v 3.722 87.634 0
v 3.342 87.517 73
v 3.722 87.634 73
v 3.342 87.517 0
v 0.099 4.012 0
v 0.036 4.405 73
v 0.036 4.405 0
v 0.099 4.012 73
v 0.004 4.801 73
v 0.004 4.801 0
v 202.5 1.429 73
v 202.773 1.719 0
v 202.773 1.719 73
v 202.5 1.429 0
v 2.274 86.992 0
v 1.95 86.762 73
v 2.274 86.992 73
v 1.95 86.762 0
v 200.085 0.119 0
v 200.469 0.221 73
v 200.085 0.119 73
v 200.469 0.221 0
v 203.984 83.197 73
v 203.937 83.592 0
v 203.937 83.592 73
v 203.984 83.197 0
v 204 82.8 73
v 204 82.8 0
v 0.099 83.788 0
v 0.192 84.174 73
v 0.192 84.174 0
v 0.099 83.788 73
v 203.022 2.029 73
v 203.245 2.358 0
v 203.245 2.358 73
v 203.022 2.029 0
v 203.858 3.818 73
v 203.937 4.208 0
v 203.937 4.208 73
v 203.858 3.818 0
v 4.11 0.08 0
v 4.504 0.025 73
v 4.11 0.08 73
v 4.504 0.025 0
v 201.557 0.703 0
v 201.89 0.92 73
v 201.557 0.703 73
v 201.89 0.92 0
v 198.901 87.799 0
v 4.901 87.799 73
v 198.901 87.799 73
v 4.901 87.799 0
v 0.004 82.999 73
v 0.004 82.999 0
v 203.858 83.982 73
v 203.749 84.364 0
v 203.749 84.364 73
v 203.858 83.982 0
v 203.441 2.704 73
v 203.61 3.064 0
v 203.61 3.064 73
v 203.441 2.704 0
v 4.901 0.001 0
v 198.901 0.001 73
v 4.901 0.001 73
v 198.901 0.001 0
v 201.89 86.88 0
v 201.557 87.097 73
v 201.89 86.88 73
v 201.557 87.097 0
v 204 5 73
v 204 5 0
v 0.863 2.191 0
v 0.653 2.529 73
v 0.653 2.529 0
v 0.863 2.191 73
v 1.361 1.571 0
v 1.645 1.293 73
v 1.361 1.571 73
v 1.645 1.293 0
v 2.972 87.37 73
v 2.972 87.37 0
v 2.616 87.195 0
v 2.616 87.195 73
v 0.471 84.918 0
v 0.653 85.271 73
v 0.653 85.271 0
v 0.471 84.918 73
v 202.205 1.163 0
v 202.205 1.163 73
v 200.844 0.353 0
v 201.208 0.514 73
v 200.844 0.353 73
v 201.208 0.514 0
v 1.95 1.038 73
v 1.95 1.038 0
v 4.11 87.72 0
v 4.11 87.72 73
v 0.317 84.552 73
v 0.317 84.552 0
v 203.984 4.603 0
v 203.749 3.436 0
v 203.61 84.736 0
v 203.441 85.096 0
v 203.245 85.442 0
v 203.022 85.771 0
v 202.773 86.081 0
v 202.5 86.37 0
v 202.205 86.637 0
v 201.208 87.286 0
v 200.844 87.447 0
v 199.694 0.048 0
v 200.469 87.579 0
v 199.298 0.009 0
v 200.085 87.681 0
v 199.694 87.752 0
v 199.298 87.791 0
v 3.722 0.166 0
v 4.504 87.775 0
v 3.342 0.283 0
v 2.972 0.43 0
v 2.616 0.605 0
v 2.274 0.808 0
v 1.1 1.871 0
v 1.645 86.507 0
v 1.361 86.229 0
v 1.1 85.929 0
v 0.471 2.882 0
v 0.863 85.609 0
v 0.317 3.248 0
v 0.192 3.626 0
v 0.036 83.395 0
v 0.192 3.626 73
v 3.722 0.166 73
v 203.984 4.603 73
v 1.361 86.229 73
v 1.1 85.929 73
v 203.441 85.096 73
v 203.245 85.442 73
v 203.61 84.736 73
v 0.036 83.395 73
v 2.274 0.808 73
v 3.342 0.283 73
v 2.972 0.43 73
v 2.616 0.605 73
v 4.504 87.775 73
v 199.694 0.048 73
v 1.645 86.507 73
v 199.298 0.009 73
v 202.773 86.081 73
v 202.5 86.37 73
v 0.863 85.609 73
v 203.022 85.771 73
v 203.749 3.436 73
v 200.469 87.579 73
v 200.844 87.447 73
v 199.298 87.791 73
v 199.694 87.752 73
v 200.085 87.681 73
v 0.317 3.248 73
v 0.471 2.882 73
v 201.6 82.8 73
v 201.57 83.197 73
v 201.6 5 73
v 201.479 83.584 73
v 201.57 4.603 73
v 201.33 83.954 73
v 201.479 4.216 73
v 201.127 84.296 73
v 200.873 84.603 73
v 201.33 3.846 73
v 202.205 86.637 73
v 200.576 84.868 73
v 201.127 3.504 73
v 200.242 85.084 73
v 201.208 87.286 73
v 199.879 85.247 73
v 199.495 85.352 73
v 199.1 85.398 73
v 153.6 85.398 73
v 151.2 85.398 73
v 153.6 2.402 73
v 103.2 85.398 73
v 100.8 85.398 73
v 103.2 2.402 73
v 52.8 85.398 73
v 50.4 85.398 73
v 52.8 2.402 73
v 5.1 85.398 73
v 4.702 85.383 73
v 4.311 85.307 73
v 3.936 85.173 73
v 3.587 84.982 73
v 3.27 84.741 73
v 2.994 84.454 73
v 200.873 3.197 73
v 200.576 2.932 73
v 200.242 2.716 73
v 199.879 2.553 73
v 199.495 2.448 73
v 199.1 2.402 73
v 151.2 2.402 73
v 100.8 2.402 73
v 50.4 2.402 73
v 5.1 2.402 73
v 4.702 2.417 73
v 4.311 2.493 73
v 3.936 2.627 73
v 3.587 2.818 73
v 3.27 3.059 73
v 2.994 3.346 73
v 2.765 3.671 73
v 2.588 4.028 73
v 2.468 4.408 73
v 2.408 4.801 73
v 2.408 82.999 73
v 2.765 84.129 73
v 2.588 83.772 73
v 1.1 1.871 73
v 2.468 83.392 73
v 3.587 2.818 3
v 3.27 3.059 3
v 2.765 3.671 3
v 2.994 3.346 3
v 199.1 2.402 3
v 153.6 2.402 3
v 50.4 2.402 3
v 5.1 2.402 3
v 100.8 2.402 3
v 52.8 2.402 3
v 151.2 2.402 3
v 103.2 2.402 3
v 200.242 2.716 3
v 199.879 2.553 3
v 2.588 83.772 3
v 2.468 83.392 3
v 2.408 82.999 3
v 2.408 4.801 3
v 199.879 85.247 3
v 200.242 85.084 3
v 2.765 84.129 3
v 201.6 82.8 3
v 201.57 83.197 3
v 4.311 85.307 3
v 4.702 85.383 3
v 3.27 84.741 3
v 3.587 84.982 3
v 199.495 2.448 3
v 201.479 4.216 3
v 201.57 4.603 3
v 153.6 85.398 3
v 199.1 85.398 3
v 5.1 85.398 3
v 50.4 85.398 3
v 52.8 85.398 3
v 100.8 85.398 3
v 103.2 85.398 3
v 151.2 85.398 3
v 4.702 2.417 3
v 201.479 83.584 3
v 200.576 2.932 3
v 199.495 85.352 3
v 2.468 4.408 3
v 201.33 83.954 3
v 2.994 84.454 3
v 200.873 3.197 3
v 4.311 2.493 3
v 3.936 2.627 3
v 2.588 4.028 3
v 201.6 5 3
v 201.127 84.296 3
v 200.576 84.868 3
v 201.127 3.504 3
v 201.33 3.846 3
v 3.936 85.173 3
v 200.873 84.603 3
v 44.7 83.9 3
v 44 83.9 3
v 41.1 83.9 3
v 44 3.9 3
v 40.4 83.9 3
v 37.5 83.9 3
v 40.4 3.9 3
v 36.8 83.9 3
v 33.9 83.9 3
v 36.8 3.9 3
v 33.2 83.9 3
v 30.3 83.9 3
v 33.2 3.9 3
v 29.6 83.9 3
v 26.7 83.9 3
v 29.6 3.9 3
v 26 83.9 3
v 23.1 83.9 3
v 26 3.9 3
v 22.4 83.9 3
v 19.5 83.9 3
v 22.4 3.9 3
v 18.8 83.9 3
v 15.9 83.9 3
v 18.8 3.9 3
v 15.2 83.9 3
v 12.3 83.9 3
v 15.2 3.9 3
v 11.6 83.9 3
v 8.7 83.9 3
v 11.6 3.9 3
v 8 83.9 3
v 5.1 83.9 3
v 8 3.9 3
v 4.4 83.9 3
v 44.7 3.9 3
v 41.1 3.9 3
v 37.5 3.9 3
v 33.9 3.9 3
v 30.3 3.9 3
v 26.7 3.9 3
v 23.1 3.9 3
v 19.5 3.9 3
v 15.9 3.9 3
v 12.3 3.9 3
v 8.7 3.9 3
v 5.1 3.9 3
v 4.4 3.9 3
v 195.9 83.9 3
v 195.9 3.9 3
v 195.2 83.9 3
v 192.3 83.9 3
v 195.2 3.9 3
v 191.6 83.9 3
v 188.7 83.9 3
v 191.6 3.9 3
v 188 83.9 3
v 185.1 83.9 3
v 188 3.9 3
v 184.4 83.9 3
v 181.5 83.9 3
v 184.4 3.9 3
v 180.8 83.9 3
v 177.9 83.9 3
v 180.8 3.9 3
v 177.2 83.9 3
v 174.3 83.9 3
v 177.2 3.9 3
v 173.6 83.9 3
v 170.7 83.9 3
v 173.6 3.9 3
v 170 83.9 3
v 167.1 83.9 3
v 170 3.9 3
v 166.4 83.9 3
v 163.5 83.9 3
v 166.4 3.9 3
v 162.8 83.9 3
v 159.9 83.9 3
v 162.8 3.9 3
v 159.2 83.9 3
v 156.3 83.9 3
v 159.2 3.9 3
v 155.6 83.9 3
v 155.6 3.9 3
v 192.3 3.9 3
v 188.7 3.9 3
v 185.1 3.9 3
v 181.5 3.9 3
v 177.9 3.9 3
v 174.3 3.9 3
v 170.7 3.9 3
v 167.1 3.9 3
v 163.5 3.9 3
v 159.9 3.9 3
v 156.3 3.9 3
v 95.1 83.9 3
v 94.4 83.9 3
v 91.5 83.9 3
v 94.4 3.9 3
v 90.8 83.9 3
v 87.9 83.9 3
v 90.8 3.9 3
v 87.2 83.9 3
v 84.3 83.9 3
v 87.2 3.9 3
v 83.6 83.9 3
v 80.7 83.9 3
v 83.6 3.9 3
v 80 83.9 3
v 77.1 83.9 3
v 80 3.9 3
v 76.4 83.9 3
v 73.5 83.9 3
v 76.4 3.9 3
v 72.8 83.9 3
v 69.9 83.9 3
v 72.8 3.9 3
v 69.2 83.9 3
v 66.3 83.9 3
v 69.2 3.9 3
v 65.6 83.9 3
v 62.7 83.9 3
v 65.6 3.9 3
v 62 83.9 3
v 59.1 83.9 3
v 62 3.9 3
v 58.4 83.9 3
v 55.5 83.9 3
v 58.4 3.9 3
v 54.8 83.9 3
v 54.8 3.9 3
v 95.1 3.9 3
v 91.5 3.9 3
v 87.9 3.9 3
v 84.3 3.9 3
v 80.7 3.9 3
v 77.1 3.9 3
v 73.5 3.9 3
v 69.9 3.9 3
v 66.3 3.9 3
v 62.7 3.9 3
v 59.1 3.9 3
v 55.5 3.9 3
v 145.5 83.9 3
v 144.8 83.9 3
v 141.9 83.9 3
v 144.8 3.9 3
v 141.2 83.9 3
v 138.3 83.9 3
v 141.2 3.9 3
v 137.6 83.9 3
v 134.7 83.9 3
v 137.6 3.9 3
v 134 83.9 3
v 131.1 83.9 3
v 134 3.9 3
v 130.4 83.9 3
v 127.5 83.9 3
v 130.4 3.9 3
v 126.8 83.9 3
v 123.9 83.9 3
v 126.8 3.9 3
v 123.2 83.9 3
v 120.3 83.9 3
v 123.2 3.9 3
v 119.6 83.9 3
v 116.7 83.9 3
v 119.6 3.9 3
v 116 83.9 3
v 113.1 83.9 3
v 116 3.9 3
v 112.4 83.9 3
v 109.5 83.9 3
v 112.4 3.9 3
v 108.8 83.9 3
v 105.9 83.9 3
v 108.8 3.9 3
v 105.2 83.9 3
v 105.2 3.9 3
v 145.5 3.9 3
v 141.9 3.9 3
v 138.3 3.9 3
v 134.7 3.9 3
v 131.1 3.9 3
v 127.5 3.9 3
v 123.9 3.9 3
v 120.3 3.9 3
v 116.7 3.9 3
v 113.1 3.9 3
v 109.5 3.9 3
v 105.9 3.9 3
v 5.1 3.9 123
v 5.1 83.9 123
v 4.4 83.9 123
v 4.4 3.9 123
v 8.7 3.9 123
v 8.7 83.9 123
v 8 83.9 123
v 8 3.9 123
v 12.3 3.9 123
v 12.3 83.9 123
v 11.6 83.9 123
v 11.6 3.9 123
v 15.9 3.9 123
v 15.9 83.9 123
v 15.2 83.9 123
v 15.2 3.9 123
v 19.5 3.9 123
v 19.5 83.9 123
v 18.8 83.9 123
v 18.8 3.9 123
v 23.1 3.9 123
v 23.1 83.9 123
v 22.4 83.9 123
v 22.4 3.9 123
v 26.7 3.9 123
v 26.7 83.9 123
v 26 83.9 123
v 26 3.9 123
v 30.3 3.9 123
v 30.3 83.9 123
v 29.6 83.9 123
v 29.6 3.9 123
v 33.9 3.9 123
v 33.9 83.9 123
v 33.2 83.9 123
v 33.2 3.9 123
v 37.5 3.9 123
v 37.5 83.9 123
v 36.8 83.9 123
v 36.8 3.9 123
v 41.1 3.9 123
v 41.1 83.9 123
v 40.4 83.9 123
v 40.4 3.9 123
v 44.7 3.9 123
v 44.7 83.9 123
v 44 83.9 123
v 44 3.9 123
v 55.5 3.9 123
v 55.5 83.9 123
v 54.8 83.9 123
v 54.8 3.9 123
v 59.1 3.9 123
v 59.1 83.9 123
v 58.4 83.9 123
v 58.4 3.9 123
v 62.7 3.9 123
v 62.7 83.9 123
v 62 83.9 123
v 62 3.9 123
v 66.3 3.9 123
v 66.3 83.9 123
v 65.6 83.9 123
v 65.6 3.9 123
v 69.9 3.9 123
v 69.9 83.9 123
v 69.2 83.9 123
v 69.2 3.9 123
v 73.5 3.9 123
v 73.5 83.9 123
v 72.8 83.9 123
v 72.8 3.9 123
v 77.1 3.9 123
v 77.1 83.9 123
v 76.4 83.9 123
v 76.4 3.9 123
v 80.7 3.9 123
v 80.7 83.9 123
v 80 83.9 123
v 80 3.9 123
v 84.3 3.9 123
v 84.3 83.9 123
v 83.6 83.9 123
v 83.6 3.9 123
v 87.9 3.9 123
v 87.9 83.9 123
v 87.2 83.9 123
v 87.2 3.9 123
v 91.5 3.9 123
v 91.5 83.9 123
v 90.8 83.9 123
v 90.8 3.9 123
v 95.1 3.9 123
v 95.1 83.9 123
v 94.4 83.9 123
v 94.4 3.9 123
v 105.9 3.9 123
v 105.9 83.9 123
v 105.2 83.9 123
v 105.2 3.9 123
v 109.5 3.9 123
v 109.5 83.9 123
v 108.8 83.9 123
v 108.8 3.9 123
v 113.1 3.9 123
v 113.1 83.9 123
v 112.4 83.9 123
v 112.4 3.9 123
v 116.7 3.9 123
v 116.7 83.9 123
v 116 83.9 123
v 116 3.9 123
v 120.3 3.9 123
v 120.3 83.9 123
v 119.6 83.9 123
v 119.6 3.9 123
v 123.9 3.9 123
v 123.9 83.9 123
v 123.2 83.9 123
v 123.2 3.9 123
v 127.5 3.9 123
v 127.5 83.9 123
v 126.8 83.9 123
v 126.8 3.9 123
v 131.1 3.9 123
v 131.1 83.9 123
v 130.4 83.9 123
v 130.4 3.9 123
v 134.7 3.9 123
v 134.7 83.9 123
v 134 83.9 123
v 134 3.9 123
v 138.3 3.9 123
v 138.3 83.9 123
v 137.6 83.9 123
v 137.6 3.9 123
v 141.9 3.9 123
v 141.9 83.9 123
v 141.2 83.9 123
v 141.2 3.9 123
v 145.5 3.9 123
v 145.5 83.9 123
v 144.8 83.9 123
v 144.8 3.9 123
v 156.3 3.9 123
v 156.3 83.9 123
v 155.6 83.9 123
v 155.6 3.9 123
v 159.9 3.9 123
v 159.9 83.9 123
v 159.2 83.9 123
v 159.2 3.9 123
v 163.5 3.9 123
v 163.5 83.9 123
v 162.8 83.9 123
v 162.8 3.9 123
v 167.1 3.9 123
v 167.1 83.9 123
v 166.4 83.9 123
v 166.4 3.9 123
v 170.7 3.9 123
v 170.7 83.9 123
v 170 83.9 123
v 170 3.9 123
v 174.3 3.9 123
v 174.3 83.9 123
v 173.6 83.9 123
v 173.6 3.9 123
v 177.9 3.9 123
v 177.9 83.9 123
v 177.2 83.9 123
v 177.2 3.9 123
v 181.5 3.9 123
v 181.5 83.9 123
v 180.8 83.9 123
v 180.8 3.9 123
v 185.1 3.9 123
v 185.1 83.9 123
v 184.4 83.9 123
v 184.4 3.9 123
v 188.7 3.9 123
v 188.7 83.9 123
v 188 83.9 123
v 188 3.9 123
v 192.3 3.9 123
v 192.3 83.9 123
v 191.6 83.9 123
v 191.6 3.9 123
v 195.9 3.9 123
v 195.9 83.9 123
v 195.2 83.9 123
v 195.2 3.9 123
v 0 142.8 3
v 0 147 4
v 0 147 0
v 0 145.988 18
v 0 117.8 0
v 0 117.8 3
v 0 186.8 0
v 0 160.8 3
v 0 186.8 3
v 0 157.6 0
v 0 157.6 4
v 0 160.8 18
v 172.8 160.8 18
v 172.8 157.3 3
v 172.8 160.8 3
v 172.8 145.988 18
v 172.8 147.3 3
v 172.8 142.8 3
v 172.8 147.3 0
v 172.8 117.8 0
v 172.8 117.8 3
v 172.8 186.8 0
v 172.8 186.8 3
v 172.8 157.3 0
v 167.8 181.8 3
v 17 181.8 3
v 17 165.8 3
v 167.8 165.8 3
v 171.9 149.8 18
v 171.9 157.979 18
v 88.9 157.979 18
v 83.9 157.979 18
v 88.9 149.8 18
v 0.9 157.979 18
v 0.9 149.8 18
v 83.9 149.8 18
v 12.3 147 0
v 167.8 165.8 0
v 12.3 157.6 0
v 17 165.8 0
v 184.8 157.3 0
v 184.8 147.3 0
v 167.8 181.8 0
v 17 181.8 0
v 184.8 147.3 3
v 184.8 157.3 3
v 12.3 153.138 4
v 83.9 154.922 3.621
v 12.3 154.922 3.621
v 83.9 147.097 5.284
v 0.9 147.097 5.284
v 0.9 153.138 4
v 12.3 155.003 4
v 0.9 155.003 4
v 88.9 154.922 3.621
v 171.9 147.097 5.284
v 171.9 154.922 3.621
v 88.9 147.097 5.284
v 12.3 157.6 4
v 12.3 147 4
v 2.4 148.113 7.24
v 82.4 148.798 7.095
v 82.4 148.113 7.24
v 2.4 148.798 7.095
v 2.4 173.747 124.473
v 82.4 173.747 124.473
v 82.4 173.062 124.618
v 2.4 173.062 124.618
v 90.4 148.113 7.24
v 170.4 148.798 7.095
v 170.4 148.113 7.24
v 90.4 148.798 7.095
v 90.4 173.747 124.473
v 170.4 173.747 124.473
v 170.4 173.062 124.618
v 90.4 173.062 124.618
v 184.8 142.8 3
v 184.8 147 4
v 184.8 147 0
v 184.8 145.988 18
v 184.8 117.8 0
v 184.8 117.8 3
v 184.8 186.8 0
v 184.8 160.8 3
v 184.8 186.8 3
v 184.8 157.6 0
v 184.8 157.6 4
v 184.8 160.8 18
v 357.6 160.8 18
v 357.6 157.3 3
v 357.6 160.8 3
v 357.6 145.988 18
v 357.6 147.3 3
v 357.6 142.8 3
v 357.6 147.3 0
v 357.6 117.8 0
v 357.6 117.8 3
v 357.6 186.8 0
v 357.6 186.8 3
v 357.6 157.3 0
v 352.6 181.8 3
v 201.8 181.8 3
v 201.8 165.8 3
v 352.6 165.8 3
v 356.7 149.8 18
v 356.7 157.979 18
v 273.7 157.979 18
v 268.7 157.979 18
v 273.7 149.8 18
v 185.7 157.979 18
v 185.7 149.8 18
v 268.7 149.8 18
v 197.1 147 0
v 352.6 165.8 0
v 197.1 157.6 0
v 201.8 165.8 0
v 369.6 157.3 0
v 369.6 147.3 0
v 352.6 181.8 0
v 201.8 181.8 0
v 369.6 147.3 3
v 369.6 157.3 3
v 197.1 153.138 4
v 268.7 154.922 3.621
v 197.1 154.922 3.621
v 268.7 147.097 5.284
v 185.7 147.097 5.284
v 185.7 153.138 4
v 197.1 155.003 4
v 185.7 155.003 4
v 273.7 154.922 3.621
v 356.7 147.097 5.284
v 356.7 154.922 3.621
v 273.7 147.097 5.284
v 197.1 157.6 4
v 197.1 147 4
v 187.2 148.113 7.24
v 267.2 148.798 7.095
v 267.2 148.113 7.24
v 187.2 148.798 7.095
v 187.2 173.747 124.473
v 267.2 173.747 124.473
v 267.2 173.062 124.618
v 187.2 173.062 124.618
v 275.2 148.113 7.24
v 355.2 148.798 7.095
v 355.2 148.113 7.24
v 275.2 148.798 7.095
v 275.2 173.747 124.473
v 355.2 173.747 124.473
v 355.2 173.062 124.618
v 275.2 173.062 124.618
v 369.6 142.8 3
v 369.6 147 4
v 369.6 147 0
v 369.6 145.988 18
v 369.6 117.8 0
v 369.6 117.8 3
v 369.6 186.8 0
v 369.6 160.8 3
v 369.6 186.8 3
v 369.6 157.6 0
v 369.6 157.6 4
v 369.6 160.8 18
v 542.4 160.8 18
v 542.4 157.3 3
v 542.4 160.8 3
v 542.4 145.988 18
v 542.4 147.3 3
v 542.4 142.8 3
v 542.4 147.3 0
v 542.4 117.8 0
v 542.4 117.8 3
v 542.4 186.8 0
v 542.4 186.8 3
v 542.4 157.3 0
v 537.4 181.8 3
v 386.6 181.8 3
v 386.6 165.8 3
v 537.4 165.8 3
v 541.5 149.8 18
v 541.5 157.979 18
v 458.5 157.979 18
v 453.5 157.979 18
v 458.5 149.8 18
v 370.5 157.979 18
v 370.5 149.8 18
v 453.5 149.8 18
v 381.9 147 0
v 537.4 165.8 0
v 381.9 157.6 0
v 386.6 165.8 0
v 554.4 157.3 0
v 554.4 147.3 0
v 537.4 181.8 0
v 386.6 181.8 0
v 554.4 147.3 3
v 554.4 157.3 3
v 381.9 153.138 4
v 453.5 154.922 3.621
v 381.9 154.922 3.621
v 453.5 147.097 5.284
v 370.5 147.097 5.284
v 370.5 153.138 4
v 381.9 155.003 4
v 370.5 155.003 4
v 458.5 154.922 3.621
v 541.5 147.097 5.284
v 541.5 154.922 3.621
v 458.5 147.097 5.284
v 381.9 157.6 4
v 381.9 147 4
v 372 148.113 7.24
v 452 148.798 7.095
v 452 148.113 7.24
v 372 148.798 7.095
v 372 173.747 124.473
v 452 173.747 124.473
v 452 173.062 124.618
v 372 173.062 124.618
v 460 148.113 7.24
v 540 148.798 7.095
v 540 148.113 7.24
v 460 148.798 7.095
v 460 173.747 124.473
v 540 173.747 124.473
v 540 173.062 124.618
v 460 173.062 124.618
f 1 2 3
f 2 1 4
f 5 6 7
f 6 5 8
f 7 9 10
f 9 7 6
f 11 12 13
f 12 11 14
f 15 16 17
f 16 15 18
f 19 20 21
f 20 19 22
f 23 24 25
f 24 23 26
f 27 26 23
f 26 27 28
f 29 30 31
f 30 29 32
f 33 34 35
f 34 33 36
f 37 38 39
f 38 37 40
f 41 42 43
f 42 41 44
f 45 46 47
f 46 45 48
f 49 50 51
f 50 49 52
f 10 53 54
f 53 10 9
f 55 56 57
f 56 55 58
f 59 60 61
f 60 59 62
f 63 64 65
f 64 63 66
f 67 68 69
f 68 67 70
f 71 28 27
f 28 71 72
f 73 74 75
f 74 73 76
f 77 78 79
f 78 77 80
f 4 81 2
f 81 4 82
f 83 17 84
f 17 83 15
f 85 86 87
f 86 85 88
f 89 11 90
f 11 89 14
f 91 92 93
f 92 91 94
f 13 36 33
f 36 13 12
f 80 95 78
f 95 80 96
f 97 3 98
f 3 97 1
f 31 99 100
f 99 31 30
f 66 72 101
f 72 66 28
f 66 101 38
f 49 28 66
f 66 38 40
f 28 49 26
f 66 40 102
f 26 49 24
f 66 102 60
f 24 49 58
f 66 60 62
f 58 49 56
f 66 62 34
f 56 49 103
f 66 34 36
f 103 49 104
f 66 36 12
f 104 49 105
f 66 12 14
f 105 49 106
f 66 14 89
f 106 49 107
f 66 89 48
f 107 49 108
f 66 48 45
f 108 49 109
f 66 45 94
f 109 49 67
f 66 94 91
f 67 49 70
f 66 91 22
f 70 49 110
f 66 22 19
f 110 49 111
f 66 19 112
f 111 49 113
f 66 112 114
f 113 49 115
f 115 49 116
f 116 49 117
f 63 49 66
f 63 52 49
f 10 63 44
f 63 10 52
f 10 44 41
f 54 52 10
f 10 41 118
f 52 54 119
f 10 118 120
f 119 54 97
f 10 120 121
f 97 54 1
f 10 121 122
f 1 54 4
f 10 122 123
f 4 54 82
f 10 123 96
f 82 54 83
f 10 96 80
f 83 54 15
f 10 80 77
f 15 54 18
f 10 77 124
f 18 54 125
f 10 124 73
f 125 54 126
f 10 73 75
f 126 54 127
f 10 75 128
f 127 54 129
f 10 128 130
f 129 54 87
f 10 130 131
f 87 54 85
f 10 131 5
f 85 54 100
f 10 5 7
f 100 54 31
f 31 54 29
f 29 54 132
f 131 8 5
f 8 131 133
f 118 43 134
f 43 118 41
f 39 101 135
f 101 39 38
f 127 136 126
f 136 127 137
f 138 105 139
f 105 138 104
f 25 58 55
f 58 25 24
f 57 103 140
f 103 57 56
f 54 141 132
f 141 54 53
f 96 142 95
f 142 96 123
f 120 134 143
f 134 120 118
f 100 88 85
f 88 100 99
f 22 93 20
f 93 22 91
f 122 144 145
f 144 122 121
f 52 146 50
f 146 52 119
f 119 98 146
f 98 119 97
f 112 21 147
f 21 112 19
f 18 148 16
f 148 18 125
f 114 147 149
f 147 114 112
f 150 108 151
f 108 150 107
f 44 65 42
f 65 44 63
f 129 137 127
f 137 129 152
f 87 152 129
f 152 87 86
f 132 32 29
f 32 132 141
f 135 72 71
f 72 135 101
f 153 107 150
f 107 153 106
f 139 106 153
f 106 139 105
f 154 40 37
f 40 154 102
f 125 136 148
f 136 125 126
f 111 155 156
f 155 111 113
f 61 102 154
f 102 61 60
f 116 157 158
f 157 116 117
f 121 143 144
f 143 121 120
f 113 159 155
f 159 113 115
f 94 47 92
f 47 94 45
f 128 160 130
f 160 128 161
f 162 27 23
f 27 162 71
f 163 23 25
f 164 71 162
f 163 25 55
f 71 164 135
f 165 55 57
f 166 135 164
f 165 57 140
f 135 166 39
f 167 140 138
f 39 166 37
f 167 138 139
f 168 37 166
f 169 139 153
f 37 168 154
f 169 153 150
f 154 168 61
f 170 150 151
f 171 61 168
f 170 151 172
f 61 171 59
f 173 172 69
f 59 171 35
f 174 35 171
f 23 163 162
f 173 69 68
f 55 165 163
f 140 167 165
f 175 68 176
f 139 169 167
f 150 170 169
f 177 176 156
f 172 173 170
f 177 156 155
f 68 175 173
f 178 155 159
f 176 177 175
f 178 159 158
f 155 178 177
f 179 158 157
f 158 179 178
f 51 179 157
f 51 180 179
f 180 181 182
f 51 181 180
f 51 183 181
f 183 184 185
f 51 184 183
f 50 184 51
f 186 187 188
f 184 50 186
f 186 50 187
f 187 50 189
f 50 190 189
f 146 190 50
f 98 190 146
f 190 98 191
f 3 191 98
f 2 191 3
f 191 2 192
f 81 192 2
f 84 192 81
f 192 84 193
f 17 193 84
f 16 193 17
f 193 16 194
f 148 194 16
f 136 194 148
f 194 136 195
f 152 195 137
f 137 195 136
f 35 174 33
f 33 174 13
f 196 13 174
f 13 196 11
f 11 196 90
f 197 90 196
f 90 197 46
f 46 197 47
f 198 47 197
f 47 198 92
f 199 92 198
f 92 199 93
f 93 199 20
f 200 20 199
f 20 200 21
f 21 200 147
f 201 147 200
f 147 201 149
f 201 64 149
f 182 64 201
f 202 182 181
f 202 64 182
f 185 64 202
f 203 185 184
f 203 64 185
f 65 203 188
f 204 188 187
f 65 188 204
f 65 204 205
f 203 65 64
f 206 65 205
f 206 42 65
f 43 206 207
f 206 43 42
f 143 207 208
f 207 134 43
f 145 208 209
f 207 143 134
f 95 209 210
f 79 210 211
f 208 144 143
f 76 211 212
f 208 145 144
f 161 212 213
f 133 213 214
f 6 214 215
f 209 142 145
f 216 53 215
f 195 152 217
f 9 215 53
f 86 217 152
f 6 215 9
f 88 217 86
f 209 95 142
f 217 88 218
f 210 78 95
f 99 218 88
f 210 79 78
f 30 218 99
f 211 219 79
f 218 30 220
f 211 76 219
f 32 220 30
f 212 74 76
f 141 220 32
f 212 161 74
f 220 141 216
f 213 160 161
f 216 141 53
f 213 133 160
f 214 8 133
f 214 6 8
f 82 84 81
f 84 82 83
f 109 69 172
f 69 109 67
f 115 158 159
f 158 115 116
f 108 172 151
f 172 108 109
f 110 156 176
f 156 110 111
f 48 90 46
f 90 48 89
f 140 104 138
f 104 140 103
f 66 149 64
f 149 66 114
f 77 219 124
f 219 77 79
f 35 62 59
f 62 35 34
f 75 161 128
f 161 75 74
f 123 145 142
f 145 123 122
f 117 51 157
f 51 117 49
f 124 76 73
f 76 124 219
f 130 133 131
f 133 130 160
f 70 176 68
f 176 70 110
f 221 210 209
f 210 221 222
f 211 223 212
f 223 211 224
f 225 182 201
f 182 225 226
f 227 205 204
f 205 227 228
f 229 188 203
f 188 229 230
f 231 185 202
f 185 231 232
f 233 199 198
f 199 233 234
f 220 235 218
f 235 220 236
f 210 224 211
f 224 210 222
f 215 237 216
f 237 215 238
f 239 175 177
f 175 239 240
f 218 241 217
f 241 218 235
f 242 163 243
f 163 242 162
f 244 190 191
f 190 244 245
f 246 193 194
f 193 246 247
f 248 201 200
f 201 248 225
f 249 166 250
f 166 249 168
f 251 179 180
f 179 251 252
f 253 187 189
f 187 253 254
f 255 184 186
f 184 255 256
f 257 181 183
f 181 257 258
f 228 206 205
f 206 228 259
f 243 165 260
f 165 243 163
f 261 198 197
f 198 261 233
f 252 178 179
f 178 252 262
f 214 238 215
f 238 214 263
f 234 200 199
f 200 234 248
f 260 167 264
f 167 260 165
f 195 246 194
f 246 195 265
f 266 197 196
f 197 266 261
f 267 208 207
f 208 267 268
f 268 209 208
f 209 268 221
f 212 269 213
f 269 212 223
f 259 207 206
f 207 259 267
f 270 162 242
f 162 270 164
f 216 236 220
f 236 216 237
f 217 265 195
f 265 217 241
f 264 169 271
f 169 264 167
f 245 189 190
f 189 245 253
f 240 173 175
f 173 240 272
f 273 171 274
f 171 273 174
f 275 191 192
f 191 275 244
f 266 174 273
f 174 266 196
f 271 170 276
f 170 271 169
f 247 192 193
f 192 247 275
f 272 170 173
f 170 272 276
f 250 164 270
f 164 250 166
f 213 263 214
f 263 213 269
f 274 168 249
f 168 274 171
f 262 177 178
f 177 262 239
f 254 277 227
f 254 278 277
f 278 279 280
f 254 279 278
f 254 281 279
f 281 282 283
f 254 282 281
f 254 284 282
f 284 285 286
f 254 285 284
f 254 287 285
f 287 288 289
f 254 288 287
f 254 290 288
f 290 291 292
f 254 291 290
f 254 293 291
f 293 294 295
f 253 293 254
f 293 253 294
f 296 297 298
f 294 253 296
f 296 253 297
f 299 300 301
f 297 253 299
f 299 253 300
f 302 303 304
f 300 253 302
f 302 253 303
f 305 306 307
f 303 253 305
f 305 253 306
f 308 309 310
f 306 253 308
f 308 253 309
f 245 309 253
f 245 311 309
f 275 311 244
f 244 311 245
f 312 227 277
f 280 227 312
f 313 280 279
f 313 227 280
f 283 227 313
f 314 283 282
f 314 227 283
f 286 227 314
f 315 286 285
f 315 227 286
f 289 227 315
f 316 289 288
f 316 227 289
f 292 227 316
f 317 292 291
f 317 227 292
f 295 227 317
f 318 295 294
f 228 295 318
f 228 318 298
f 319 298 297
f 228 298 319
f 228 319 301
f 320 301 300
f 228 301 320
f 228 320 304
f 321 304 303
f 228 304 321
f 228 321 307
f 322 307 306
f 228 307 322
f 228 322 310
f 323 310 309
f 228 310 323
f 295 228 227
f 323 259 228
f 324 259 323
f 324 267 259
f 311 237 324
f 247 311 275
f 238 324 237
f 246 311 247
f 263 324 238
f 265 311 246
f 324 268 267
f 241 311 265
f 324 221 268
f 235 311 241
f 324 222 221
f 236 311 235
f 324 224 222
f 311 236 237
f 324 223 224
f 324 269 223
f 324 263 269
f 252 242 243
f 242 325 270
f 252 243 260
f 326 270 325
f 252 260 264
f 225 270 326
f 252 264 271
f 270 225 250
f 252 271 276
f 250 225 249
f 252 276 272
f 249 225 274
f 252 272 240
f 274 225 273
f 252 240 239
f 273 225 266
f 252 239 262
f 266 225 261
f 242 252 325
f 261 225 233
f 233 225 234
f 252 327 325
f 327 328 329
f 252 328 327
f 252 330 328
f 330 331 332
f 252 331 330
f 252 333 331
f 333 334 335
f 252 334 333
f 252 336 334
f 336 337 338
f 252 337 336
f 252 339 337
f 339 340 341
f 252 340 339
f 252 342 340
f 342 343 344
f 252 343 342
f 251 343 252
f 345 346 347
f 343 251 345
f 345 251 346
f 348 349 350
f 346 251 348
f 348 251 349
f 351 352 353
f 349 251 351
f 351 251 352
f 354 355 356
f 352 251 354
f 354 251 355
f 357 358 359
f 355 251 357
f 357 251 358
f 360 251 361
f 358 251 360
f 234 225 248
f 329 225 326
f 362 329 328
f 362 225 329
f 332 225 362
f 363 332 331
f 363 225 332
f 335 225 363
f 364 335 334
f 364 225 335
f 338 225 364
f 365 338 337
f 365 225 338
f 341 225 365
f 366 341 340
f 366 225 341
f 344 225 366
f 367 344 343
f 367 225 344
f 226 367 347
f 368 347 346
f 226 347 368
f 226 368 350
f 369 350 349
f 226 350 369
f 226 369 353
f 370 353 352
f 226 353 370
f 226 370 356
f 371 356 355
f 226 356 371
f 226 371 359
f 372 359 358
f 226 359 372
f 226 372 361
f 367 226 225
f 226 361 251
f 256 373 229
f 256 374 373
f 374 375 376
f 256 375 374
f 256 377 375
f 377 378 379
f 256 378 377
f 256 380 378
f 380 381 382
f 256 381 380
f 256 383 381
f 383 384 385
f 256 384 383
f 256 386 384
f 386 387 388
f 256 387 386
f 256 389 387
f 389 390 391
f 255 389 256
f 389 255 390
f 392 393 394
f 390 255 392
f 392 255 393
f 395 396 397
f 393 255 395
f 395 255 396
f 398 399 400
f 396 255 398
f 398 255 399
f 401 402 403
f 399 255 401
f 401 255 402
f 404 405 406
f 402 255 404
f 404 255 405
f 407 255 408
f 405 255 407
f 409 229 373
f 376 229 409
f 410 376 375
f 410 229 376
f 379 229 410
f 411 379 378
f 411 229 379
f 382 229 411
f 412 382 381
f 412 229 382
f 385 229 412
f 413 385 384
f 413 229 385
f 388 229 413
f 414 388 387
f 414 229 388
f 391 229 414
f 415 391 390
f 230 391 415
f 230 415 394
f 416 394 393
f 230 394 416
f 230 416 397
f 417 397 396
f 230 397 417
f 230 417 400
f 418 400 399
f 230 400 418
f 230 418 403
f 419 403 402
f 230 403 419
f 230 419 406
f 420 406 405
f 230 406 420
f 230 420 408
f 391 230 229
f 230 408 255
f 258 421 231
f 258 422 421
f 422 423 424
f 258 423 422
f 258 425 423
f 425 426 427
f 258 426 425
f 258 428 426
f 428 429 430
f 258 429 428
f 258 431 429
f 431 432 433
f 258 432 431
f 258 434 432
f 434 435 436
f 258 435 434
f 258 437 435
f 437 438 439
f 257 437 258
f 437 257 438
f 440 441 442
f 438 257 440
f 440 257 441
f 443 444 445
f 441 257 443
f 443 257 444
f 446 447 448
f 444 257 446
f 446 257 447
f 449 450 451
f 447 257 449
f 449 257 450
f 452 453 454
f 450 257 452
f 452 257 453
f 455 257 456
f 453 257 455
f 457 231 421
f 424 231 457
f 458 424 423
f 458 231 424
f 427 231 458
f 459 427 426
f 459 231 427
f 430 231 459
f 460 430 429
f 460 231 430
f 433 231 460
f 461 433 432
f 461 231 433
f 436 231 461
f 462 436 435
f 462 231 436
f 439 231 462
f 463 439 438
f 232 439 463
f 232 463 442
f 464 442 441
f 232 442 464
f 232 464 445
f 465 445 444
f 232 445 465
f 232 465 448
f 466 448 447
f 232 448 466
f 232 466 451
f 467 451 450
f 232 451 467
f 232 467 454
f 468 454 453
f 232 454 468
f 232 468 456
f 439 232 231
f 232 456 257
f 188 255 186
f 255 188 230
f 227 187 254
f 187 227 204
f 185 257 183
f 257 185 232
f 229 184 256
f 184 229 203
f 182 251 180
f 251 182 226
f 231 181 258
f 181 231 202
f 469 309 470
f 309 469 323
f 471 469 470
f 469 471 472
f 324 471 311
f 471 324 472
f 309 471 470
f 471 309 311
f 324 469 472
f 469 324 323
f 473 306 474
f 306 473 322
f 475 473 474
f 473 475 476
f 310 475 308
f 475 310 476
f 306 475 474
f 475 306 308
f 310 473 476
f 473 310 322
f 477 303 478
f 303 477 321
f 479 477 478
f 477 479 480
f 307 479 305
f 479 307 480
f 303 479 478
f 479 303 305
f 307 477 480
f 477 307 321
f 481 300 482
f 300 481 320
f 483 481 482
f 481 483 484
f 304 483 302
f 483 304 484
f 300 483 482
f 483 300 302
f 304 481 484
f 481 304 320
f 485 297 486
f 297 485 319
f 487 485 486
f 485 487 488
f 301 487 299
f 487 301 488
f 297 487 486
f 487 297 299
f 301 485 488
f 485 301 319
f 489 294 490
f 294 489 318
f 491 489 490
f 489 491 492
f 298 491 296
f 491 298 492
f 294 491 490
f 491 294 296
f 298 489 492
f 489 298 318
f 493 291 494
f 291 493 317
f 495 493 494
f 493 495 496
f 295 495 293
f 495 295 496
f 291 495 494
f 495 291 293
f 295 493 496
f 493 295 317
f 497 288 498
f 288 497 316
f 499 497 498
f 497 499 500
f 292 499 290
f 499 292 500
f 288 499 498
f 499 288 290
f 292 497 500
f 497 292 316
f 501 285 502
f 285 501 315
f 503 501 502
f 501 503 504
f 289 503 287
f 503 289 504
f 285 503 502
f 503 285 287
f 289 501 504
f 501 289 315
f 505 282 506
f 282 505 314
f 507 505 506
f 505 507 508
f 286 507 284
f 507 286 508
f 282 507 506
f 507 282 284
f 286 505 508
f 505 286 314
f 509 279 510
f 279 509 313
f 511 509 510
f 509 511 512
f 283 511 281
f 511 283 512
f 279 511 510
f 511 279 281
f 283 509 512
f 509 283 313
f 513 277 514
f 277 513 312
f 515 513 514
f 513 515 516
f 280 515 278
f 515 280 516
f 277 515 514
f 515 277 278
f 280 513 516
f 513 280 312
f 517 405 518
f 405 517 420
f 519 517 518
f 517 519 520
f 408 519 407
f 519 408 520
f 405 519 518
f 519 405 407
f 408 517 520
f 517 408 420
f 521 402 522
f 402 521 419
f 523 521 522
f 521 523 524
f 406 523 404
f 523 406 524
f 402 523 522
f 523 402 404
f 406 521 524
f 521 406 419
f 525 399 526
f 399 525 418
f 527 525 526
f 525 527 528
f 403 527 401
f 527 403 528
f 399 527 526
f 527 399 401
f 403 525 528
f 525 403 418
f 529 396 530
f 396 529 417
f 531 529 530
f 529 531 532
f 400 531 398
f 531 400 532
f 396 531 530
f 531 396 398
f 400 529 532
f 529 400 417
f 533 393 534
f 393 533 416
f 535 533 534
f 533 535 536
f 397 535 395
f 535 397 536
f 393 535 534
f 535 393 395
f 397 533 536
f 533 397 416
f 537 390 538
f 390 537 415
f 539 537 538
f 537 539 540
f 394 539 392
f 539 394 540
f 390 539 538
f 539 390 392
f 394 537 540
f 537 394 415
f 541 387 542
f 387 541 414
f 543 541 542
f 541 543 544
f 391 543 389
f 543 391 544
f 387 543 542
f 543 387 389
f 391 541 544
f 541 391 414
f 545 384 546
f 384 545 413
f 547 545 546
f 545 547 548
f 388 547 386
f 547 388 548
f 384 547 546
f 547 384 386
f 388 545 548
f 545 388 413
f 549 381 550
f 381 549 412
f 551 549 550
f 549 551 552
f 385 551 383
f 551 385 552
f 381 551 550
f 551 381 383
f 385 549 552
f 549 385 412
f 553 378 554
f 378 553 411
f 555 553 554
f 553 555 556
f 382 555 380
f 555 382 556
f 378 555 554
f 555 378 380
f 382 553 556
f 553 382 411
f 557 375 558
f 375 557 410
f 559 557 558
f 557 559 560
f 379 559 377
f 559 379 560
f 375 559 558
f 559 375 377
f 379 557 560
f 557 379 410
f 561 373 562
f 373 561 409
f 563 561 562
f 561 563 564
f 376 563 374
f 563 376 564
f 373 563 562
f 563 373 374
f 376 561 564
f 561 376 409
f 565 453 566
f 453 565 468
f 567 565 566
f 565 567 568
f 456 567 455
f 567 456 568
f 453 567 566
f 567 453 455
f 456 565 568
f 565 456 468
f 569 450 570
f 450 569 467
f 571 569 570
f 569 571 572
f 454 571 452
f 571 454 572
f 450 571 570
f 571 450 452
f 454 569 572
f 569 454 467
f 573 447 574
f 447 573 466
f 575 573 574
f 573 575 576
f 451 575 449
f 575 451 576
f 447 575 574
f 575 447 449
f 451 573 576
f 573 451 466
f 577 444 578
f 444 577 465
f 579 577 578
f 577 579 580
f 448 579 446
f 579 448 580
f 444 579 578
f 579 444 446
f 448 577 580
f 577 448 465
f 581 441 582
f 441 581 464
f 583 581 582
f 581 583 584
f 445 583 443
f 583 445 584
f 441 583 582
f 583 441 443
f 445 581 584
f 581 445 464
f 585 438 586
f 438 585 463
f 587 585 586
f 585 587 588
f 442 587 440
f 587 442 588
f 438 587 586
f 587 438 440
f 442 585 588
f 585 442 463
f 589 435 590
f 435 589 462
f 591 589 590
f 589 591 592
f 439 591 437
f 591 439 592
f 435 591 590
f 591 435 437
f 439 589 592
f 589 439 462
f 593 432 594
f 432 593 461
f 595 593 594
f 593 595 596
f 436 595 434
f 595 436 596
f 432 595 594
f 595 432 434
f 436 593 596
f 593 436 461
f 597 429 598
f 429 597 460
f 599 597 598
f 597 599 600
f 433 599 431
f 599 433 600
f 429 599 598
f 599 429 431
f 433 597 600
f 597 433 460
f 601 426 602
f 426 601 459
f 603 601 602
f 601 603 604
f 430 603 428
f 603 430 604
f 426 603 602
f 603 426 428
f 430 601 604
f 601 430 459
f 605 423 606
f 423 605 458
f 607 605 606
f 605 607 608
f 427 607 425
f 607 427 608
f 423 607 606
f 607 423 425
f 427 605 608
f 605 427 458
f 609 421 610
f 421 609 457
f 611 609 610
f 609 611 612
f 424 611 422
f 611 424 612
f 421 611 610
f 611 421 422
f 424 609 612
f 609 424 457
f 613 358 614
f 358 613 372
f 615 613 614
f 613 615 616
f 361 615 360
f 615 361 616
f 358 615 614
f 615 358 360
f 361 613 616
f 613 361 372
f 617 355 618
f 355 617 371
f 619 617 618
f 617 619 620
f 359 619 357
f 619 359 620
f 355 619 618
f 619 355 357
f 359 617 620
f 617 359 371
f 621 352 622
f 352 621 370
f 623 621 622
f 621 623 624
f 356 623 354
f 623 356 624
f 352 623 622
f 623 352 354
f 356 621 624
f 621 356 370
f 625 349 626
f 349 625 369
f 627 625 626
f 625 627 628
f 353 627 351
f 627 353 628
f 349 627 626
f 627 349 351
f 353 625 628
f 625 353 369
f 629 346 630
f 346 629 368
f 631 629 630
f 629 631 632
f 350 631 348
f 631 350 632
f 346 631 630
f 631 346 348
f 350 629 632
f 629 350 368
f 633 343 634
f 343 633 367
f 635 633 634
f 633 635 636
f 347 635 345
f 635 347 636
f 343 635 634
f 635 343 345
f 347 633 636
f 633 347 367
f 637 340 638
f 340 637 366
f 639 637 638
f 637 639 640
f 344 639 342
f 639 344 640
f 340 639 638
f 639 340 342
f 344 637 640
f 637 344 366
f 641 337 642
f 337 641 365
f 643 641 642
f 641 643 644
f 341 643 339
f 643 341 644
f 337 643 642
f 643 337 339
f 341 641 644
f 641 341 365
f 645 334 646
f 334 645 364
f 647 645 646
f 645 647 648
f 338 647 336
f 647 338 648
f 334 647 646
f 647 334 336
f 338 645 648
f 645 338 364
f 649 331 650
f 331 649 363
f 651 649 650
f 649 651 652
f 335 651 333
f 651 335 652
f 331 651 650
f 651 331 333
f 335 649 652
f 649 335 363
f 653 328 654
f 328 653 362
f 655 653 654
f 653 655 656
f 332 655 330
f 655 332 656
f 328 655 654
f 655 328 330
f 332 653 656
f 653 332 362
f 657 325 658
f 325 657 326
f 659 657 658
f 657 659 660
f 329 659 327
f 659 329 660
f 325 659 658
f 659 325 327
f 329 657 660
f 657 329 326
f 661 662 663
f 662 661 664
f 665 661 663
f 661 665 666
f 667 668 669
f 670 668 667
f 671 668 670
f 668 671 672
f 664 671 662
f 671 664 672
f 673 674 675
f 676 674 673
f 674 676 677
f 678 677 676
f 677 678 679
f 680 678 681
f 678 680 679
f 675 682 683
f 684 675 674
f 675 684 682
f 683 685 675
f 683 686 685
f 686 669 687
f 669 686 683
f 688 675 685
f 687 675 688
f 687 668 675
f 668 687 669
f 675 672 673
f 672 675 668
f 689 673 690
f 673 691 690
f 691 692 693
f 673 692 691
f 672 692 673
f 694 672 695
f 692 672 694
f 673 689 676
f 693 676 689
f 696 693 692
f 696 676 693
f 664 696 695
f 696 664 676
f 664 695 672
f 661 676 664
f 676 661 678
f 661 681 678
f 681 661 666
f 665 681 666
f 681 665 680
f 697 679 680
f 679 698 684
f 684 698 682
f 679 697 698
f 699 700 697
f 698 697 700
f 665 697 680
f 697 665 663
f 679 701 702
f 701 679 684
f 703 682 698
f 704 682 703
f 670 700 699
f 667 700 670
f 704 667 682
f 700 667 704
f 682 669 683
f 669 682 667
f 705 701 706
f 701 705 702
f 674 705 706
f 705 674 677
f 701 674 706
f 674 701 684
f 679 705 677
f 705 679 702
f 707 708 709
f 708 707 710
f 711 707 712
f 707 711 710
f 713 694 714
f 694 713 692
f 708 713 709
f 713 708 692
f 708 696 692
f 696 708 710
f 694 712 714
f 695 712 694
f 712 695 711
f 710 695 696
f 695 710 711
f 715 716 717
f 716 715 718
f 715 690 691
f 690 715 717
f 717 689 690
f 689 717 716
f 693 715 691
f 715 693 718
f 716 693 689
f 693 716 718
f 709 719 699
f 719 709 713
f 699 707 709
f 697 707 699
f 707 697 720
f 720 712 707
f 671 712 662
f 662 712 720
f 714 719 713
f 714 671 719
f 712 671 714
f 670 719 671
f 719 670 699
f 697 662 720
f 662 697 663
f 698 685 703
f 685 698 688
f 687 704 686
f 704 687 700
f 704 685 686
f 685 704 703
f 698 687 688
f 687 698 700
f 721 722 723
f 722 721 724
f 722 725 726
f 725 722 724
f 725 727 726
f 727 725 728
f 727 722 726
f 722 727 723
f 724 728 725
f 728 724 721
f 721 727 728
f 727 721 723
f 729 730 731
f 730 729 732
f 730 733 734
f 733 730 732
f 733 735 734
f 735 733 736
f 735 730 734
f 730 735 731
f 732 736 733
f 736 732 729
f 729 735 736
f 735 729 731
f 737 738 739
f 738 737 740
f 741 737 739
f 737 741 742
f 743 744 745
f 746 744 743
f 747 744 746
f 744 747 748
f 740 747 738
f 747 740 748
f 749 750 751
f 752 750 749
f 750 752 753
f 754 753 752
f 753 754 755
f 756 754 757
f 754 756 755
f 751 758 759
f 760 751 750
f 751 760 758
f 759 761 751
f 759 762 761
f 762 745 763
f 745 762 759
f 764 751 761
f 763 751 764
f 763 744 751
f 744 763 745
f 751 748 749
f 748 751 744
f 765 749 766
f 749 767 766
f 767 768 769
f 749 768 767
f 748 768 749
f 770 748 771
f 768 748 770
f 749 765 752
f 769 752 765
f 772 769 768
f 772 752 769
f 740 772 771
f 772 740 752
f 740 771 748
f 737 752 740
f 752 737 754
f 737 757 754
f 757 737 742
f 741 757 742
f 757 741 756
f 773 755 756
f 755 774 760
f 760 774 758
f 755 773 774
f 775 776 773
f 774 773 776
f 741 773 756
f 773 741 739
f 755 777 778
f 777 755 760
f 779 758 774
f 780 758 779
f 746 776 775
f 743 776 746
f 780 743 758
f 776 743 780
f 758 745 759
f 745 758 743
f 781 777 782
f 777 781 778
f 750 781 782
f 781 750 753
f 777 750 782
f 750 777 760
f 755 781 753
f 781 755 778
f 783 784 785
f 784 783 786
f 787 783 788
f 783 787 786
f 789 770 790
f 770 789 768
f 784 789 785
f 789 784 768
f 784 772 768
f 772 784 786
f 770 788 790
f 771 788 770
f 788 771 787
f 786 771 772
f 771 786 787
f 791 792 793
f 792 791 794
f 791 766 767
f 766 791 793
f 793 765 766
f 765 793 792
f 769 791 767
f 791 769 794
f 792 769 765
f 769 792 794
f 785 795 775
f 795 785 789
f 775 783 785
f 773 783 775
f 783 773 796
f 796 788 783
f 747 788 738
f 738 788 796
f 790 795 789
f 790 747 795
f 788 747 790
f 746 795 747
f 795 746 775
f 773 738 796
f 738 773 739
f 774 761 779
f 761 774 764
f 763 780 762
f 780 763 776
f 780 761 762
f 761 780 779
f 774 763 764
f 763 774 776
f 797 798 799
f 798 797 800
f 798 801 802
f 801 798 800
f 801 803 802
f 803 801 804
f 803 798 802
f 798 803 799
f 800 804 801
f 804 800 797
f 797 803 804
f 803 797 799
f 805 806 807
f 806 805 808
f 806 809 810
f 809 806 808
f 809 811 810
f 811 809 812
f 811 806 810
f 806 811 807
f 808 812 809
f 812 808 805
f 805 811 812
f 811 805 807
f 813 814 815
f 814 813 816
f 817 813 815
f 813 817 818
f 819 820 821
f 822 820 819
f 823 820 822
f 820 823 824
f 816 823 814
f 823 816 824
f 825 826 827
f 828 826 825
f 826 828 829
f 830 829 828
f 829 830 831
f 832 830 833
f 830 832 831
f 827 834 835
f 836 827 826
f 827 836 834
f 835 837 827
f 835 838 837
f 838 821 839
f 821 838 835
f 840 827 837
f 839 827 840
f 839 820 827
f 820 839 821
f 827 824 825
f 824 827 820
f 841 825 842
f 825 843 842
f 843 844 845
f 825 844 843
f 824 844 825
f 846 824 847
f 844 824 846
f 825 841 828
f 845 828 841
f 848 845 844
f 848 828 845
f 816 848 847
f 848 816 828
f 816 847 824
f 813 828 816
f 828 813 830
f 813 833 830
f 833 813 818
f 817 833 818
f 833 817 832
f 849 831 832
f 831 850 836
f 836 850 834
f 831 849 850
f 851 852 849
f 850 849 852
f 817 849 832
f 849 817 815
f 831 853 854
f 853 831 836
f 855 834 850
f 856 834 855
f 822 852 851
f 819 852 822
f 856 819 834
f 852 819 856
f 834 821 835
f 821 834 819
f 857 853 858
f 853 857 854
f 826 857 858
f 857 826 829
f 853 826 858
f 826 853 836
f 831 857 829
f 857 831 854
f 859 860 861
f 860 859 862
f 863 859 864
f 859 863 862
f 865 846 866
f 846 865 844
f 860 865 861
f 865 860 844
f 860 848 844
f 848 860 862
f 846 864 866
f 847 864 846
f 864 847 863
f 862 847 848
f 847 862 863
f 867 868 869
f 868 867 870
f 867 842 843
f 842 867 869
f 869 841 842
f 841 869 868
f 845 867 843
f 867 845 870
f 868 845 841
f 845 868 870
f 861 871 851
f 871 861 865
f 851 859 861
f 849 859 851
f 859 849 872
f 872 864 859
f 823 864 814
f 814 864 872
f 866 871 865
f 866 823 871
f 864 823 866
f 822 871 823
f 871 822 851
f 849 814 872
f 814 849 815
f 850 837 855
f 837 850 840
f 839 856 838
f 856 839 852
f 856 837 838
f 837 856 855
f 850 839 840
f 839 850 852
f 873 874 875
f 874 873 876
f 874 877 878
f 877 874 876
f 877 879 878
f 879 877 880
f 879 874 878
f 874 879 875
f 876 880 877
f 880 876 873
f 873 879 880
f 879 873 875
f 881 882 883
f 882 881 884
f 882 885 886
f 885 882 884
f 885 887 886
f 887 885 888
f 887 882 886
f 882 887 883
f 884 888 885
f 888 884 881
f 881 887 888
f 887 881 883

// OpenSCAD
// =====================================================================
//  zeigmal — the card furniture
//  A box the cards live in, sorted into four compartments, and a shelf
//  that puts a theme's cards up where a child can see and take them.
//  For the same printer and the same card as the holder next door.
//
//  Numbers carry the same tags as case/zeigmal-case.scad:
//
//    [M]  measured          [R]  researched
//    [A]  ASSUMPTION        [K]  design decision
//    [G]  computed — do NOT edit by hand
//
//  Coordinates: x along the length of a thing, y away from the child, z up.
//  Both parts stand on the table at z = 0 and print in that orientation.
//
//  The one thing to know before changing anything: a card is 80 mm wide,
//  and the children wanted them side by side rather than overlapping, so a
//  shelf costs 88 mm per card and two is all a 220 mm bed will take. That is
//  why there are several small shelves instead of one long one, and why
//  they clip together (ADR 0010).
// =====================================================================


/* ---------- 0.  What to render ---------- */

// "box" | "shelf" | "shelves" | "row" | "all"
part = "all";
show_cards = true;

$fa = 3;
$fs = 0.4;


/* =====================================================================
   1.  THE CARD — the same one the holder is built for
   ===================================================================== */

card_w = 80.0;   // [M] Stefanie, 2026-09-14
card_h = 120.0;  // [A] from the box the set came in
card_t =  0.7;   // [A] 300 g paper in 2 x 125 µm laminate
pitch  =  1.0;   // [A] per card in a stack: the laminate bows a little


/* =====================================================================
   2.  WALLS AND AIR  [K] — the station's numbers, so they look alike
   ===================================================================== */

wall     = 2.4;   // every printed wall — 6 x 0.4, 3 perimeters
floor_t  = 3.0;   // the floor of the box and the foot of a shelf
clr      = 1.5;   // air beside a card in a compartment
corner_r = 5.0;   // the box's upright corners, as on the station's top
bed      = [220, 220, 250];   // [R] Ender 3 V2


/* =====================================================================
   3.  THE BOX  [K]
   ===================================================================== */

box_comps = 4;     // compartments, one theme each
box_comp  = 48;    // along the box: 48 cards per compartment
box_h     = 70;    // the cards stand 50 mm proud of this

// No scoops. The first drawing had a thumb scoop in each compartment's
// long walls; with 50 mm of card standing proud there is nothing for them
// to do, and they only weaken the walls.


/* =====================================================================
   4.  THE SHELF  [K]
   ===================================================================== */

sh_n      = 2;     // cards side by side — two is what the bed allows
sh_pitch  = 88;    // card to card, so no card hides any part of another
sh_lean   = 12;    // degrees back from vertical
sh_slot   = 8.0;   // slot width: the one on show plus its spares behind
sh_depth  = 13;    // how deep the slot holds a card
sh_bar_d  = 18;    // the slotted bar, front to back
sh_bar_h  = 18;    // and tall
sh_slot_y = 7.0;   // where the slot sits in the bar, from its front
sh_front  = 25;    // how far the foot reaches IN FRONT of the bar. Without
                   // it a pull at the top of a card tips the shelf at 0.3 N,
                   // which is the weight of a sheet of paper
sh_base   = 69;    // the foot, front edge to back edge
plate_deg = 12;    // the bar's front leans back this much: the name plate
window_rim = 5.0;  // the rim left round the window that lightens the foot

// The tab that joins one shelf to the next, so a row of them stays a row
// when a child pulls a card out of the middle.
tab_w   = 12.0;   // along x, how far it sticks out
tab_d   = 10.0;   // across
tab_clr =  0.3;   // per side in the socket


/* =====================================================================
   5.  DERIVED  [G] — do not edit
   ===================================================================== */

box_inner_w = card_w + 2 * clr;                                   // 83
box_inner_l = box_comps * box_comp + (box_comps - 1) * wall;      // 199.2
box_l = box_inner_l + 2 * wall;                                   // 204
box_w = box_inner_w + 2 * wall;                                   // 87.8
box_cards = box_comps * floor(box_comp / pitch);                  // 192

sh_l = card_w + (sh_n - 1) * sh_pitch + 2 * wall;                 // 172.8
sh_cards_per_slot = floor(sh_slot / pitch);                       // 8
sh_bar_y      = sh_front;                             // the bar's front face
sh_plate_back = (sh_bar_h - floor_t) * tan(plate_deg);  // how far it leans
sh_front_wall = sh_slot_y - sh_plate_back;   // what is left of it at the top
sh_plate_h    = (sh_bar_h - floor_t) / cos(plate_deg);  // the name plate itself

echo(str("box       ", box_l, " x ", box_w, " x ", box_h + floor_t,
         " mm, ", box_comps, " x ", floor(box_comp / pitch), " = ", box_cards, " cards"));
echo(str("shelf     ", sh_l, " x ", sh_base, " x ", sh_bar_h,
         " mm, ", sh_n, " on show, ", sh_n * sh_cards_per_slot, " in all"));
echo(str("shelf     ", sh_bar_h + card_h * cos(sh_lean), " mm tall with cards; ",
         "name plate ", sh_plate_h, " mm, front wall ",
         sh_front_wall, " mm at its thinnest"));
echo(str("row       ", sh_n * 3, " cards on three shelves = ", 3 * sh_l + 2 * tab_w, " mm of table"));


/* =====================================================================
   6.  HELPERS
   ===================================================================== */

module rounded_rect(w, h, r) {
    hull() for (x = [r, w - r], y = [r, h - r]) translate([x, y]) circle(r);
}

module card(a = 1.0) {               // width along x, thickness along y
    color("Goldenrod", a) cube([card_w, card_t, card_h]);
}

module card_filed(a = 1.0) {         // thickness along x, width along y
    color("Goldenrod", a) cube([card_t, card_w, card_h]);
}


/* =====================================================================
   7.  THE BOX
   ===================================================================== */

module box() {
    difference() {
        linear_extrude(box_h + floor_t) rounded_rect(box_l, box_w, corner_r);
        translate([wall, wall, floor_t]) linear_extrude(box_h + 1)
            rounded_rect(box_inner_l, box_inner_w, max(corner_r - wall, 1.2));
    }
    // the dividers, full height so a theme stays a theme
    if (box_comps > 1)
        for (i = [1 : box_comps - 1])
            translate([wall + i * box_comp + (i - 1) * wall, wall, floor_t])
                cube([wall, box_inner_w, box_h]);

    if (show_cards)
        for (i = [0 : box_comps - 1], k = [0 : 11])
            translate([wall + i * (box_comp + wall) + 2 + k * 3.6, wall + clr, floor_t])
                card_filed();
}


/* =====================================================================
   8.  THE SHELF
   ===================================================================== */

// The bar's cross section, seen from the end: the foot runs back, the bar
// stands at the front, and the bar's face leans back as it rises — that
// face is the name plate, and leaning it back is also what keeps it from
// being an overhang.
function bar_profile() = [
    [0, 0],
    [sh_base, 0],
    [sh_base, floor_t],
    [sh_bar_y + sh_bar_d, floor_t],
    [sh_bar_y + sh_bar_d, sh_bar_h],
    [sh_bar_y + sh_plate_back, sh_bar_h],
    [sh_bar_y, floor_t],
    [0, floor_t]
];

module shelf_body() {
    translate([0, 0, 0]) rotate([90, 0, 90]) linear_extrude(sh_l) polygon(bar_profile());
}

// A tab on the right end, a socket on the left, so shelves make a row.
module shelf_tab() {
    translate([sh_l, (sh_base - tab_d) / 2, 0]) cube([tab_w, tab_d, floor_t]);
}

module shelf_socket() {
    translate([-1, (sh_base - tab_d) / 2 - tab_clr, -1])
        cube([tab_w + 1 + tab_clr, tab_d + 2 * tab_clr, floor_t + 2]);
}

// The foot behind the bar carries nothing but its own weight; a window in
// it takes a sixth off the print and leaves a rim all round. It clears the
// socket at the left end and the tab's root at the right.
module shelf_window() {
    translate([tab_w + window_rim, sh_bar_y + sh_bar_d + window_rim, -1])
        cube([sh_l - tab_w - 2 * window_rim,
              sh_base - sh_bar_y - sh_bar_d - 2 * window_rim, floor_t + 2]);
}

module shelf() {
    difference() {
        union() {
            shelf_body();
            shelf_tab();
        }
        shelf_socket();
        shelf_window();
        for (i = [0 : sh_n - 1])
            translate([wall + i * sh_pitch - clr, sh_bar_y + sh_slot_y, sh_bar_h])
                rotate([-sh_lean, 0, 0]) translate([0, 0, -sh_depth])
                    cube([card_w + 2 * clr, sh_slot, sh_depth + 20]);
    }
    if (show_cards)
        for (i = [0 : sh_n - 1])
            translate([wall + i * sh_pitch, sh_bar_y + sh_slot_y + 0.6, sh_bar_h])
                rotate([-sh_lean, 0, 0]) translate([0, 0, -sh_depth + 2]) card();
}


/* =====================================================================
   9.  RENDER
   ===================================================================== */

if (part == "box") box();
else if (part == "shelf") shelf();
else if (part == "shelves") for (k = [0 : 2]) translate([0, k * (sh_base + 10), 0]) shelf();
else if (part == "row") for (k = [0 : 2]) translate([k * (sh_l + tab_w), 0, 0]) shelf();
else if (part == "all") {
    box();
    translate([0, box_w + 30, 0]) for (k = [0 : 2]) translate([k * (sh_l + tab_w), 0, 0]) shelf();
}
else echo(str("unknown part \"", part, "\""));
